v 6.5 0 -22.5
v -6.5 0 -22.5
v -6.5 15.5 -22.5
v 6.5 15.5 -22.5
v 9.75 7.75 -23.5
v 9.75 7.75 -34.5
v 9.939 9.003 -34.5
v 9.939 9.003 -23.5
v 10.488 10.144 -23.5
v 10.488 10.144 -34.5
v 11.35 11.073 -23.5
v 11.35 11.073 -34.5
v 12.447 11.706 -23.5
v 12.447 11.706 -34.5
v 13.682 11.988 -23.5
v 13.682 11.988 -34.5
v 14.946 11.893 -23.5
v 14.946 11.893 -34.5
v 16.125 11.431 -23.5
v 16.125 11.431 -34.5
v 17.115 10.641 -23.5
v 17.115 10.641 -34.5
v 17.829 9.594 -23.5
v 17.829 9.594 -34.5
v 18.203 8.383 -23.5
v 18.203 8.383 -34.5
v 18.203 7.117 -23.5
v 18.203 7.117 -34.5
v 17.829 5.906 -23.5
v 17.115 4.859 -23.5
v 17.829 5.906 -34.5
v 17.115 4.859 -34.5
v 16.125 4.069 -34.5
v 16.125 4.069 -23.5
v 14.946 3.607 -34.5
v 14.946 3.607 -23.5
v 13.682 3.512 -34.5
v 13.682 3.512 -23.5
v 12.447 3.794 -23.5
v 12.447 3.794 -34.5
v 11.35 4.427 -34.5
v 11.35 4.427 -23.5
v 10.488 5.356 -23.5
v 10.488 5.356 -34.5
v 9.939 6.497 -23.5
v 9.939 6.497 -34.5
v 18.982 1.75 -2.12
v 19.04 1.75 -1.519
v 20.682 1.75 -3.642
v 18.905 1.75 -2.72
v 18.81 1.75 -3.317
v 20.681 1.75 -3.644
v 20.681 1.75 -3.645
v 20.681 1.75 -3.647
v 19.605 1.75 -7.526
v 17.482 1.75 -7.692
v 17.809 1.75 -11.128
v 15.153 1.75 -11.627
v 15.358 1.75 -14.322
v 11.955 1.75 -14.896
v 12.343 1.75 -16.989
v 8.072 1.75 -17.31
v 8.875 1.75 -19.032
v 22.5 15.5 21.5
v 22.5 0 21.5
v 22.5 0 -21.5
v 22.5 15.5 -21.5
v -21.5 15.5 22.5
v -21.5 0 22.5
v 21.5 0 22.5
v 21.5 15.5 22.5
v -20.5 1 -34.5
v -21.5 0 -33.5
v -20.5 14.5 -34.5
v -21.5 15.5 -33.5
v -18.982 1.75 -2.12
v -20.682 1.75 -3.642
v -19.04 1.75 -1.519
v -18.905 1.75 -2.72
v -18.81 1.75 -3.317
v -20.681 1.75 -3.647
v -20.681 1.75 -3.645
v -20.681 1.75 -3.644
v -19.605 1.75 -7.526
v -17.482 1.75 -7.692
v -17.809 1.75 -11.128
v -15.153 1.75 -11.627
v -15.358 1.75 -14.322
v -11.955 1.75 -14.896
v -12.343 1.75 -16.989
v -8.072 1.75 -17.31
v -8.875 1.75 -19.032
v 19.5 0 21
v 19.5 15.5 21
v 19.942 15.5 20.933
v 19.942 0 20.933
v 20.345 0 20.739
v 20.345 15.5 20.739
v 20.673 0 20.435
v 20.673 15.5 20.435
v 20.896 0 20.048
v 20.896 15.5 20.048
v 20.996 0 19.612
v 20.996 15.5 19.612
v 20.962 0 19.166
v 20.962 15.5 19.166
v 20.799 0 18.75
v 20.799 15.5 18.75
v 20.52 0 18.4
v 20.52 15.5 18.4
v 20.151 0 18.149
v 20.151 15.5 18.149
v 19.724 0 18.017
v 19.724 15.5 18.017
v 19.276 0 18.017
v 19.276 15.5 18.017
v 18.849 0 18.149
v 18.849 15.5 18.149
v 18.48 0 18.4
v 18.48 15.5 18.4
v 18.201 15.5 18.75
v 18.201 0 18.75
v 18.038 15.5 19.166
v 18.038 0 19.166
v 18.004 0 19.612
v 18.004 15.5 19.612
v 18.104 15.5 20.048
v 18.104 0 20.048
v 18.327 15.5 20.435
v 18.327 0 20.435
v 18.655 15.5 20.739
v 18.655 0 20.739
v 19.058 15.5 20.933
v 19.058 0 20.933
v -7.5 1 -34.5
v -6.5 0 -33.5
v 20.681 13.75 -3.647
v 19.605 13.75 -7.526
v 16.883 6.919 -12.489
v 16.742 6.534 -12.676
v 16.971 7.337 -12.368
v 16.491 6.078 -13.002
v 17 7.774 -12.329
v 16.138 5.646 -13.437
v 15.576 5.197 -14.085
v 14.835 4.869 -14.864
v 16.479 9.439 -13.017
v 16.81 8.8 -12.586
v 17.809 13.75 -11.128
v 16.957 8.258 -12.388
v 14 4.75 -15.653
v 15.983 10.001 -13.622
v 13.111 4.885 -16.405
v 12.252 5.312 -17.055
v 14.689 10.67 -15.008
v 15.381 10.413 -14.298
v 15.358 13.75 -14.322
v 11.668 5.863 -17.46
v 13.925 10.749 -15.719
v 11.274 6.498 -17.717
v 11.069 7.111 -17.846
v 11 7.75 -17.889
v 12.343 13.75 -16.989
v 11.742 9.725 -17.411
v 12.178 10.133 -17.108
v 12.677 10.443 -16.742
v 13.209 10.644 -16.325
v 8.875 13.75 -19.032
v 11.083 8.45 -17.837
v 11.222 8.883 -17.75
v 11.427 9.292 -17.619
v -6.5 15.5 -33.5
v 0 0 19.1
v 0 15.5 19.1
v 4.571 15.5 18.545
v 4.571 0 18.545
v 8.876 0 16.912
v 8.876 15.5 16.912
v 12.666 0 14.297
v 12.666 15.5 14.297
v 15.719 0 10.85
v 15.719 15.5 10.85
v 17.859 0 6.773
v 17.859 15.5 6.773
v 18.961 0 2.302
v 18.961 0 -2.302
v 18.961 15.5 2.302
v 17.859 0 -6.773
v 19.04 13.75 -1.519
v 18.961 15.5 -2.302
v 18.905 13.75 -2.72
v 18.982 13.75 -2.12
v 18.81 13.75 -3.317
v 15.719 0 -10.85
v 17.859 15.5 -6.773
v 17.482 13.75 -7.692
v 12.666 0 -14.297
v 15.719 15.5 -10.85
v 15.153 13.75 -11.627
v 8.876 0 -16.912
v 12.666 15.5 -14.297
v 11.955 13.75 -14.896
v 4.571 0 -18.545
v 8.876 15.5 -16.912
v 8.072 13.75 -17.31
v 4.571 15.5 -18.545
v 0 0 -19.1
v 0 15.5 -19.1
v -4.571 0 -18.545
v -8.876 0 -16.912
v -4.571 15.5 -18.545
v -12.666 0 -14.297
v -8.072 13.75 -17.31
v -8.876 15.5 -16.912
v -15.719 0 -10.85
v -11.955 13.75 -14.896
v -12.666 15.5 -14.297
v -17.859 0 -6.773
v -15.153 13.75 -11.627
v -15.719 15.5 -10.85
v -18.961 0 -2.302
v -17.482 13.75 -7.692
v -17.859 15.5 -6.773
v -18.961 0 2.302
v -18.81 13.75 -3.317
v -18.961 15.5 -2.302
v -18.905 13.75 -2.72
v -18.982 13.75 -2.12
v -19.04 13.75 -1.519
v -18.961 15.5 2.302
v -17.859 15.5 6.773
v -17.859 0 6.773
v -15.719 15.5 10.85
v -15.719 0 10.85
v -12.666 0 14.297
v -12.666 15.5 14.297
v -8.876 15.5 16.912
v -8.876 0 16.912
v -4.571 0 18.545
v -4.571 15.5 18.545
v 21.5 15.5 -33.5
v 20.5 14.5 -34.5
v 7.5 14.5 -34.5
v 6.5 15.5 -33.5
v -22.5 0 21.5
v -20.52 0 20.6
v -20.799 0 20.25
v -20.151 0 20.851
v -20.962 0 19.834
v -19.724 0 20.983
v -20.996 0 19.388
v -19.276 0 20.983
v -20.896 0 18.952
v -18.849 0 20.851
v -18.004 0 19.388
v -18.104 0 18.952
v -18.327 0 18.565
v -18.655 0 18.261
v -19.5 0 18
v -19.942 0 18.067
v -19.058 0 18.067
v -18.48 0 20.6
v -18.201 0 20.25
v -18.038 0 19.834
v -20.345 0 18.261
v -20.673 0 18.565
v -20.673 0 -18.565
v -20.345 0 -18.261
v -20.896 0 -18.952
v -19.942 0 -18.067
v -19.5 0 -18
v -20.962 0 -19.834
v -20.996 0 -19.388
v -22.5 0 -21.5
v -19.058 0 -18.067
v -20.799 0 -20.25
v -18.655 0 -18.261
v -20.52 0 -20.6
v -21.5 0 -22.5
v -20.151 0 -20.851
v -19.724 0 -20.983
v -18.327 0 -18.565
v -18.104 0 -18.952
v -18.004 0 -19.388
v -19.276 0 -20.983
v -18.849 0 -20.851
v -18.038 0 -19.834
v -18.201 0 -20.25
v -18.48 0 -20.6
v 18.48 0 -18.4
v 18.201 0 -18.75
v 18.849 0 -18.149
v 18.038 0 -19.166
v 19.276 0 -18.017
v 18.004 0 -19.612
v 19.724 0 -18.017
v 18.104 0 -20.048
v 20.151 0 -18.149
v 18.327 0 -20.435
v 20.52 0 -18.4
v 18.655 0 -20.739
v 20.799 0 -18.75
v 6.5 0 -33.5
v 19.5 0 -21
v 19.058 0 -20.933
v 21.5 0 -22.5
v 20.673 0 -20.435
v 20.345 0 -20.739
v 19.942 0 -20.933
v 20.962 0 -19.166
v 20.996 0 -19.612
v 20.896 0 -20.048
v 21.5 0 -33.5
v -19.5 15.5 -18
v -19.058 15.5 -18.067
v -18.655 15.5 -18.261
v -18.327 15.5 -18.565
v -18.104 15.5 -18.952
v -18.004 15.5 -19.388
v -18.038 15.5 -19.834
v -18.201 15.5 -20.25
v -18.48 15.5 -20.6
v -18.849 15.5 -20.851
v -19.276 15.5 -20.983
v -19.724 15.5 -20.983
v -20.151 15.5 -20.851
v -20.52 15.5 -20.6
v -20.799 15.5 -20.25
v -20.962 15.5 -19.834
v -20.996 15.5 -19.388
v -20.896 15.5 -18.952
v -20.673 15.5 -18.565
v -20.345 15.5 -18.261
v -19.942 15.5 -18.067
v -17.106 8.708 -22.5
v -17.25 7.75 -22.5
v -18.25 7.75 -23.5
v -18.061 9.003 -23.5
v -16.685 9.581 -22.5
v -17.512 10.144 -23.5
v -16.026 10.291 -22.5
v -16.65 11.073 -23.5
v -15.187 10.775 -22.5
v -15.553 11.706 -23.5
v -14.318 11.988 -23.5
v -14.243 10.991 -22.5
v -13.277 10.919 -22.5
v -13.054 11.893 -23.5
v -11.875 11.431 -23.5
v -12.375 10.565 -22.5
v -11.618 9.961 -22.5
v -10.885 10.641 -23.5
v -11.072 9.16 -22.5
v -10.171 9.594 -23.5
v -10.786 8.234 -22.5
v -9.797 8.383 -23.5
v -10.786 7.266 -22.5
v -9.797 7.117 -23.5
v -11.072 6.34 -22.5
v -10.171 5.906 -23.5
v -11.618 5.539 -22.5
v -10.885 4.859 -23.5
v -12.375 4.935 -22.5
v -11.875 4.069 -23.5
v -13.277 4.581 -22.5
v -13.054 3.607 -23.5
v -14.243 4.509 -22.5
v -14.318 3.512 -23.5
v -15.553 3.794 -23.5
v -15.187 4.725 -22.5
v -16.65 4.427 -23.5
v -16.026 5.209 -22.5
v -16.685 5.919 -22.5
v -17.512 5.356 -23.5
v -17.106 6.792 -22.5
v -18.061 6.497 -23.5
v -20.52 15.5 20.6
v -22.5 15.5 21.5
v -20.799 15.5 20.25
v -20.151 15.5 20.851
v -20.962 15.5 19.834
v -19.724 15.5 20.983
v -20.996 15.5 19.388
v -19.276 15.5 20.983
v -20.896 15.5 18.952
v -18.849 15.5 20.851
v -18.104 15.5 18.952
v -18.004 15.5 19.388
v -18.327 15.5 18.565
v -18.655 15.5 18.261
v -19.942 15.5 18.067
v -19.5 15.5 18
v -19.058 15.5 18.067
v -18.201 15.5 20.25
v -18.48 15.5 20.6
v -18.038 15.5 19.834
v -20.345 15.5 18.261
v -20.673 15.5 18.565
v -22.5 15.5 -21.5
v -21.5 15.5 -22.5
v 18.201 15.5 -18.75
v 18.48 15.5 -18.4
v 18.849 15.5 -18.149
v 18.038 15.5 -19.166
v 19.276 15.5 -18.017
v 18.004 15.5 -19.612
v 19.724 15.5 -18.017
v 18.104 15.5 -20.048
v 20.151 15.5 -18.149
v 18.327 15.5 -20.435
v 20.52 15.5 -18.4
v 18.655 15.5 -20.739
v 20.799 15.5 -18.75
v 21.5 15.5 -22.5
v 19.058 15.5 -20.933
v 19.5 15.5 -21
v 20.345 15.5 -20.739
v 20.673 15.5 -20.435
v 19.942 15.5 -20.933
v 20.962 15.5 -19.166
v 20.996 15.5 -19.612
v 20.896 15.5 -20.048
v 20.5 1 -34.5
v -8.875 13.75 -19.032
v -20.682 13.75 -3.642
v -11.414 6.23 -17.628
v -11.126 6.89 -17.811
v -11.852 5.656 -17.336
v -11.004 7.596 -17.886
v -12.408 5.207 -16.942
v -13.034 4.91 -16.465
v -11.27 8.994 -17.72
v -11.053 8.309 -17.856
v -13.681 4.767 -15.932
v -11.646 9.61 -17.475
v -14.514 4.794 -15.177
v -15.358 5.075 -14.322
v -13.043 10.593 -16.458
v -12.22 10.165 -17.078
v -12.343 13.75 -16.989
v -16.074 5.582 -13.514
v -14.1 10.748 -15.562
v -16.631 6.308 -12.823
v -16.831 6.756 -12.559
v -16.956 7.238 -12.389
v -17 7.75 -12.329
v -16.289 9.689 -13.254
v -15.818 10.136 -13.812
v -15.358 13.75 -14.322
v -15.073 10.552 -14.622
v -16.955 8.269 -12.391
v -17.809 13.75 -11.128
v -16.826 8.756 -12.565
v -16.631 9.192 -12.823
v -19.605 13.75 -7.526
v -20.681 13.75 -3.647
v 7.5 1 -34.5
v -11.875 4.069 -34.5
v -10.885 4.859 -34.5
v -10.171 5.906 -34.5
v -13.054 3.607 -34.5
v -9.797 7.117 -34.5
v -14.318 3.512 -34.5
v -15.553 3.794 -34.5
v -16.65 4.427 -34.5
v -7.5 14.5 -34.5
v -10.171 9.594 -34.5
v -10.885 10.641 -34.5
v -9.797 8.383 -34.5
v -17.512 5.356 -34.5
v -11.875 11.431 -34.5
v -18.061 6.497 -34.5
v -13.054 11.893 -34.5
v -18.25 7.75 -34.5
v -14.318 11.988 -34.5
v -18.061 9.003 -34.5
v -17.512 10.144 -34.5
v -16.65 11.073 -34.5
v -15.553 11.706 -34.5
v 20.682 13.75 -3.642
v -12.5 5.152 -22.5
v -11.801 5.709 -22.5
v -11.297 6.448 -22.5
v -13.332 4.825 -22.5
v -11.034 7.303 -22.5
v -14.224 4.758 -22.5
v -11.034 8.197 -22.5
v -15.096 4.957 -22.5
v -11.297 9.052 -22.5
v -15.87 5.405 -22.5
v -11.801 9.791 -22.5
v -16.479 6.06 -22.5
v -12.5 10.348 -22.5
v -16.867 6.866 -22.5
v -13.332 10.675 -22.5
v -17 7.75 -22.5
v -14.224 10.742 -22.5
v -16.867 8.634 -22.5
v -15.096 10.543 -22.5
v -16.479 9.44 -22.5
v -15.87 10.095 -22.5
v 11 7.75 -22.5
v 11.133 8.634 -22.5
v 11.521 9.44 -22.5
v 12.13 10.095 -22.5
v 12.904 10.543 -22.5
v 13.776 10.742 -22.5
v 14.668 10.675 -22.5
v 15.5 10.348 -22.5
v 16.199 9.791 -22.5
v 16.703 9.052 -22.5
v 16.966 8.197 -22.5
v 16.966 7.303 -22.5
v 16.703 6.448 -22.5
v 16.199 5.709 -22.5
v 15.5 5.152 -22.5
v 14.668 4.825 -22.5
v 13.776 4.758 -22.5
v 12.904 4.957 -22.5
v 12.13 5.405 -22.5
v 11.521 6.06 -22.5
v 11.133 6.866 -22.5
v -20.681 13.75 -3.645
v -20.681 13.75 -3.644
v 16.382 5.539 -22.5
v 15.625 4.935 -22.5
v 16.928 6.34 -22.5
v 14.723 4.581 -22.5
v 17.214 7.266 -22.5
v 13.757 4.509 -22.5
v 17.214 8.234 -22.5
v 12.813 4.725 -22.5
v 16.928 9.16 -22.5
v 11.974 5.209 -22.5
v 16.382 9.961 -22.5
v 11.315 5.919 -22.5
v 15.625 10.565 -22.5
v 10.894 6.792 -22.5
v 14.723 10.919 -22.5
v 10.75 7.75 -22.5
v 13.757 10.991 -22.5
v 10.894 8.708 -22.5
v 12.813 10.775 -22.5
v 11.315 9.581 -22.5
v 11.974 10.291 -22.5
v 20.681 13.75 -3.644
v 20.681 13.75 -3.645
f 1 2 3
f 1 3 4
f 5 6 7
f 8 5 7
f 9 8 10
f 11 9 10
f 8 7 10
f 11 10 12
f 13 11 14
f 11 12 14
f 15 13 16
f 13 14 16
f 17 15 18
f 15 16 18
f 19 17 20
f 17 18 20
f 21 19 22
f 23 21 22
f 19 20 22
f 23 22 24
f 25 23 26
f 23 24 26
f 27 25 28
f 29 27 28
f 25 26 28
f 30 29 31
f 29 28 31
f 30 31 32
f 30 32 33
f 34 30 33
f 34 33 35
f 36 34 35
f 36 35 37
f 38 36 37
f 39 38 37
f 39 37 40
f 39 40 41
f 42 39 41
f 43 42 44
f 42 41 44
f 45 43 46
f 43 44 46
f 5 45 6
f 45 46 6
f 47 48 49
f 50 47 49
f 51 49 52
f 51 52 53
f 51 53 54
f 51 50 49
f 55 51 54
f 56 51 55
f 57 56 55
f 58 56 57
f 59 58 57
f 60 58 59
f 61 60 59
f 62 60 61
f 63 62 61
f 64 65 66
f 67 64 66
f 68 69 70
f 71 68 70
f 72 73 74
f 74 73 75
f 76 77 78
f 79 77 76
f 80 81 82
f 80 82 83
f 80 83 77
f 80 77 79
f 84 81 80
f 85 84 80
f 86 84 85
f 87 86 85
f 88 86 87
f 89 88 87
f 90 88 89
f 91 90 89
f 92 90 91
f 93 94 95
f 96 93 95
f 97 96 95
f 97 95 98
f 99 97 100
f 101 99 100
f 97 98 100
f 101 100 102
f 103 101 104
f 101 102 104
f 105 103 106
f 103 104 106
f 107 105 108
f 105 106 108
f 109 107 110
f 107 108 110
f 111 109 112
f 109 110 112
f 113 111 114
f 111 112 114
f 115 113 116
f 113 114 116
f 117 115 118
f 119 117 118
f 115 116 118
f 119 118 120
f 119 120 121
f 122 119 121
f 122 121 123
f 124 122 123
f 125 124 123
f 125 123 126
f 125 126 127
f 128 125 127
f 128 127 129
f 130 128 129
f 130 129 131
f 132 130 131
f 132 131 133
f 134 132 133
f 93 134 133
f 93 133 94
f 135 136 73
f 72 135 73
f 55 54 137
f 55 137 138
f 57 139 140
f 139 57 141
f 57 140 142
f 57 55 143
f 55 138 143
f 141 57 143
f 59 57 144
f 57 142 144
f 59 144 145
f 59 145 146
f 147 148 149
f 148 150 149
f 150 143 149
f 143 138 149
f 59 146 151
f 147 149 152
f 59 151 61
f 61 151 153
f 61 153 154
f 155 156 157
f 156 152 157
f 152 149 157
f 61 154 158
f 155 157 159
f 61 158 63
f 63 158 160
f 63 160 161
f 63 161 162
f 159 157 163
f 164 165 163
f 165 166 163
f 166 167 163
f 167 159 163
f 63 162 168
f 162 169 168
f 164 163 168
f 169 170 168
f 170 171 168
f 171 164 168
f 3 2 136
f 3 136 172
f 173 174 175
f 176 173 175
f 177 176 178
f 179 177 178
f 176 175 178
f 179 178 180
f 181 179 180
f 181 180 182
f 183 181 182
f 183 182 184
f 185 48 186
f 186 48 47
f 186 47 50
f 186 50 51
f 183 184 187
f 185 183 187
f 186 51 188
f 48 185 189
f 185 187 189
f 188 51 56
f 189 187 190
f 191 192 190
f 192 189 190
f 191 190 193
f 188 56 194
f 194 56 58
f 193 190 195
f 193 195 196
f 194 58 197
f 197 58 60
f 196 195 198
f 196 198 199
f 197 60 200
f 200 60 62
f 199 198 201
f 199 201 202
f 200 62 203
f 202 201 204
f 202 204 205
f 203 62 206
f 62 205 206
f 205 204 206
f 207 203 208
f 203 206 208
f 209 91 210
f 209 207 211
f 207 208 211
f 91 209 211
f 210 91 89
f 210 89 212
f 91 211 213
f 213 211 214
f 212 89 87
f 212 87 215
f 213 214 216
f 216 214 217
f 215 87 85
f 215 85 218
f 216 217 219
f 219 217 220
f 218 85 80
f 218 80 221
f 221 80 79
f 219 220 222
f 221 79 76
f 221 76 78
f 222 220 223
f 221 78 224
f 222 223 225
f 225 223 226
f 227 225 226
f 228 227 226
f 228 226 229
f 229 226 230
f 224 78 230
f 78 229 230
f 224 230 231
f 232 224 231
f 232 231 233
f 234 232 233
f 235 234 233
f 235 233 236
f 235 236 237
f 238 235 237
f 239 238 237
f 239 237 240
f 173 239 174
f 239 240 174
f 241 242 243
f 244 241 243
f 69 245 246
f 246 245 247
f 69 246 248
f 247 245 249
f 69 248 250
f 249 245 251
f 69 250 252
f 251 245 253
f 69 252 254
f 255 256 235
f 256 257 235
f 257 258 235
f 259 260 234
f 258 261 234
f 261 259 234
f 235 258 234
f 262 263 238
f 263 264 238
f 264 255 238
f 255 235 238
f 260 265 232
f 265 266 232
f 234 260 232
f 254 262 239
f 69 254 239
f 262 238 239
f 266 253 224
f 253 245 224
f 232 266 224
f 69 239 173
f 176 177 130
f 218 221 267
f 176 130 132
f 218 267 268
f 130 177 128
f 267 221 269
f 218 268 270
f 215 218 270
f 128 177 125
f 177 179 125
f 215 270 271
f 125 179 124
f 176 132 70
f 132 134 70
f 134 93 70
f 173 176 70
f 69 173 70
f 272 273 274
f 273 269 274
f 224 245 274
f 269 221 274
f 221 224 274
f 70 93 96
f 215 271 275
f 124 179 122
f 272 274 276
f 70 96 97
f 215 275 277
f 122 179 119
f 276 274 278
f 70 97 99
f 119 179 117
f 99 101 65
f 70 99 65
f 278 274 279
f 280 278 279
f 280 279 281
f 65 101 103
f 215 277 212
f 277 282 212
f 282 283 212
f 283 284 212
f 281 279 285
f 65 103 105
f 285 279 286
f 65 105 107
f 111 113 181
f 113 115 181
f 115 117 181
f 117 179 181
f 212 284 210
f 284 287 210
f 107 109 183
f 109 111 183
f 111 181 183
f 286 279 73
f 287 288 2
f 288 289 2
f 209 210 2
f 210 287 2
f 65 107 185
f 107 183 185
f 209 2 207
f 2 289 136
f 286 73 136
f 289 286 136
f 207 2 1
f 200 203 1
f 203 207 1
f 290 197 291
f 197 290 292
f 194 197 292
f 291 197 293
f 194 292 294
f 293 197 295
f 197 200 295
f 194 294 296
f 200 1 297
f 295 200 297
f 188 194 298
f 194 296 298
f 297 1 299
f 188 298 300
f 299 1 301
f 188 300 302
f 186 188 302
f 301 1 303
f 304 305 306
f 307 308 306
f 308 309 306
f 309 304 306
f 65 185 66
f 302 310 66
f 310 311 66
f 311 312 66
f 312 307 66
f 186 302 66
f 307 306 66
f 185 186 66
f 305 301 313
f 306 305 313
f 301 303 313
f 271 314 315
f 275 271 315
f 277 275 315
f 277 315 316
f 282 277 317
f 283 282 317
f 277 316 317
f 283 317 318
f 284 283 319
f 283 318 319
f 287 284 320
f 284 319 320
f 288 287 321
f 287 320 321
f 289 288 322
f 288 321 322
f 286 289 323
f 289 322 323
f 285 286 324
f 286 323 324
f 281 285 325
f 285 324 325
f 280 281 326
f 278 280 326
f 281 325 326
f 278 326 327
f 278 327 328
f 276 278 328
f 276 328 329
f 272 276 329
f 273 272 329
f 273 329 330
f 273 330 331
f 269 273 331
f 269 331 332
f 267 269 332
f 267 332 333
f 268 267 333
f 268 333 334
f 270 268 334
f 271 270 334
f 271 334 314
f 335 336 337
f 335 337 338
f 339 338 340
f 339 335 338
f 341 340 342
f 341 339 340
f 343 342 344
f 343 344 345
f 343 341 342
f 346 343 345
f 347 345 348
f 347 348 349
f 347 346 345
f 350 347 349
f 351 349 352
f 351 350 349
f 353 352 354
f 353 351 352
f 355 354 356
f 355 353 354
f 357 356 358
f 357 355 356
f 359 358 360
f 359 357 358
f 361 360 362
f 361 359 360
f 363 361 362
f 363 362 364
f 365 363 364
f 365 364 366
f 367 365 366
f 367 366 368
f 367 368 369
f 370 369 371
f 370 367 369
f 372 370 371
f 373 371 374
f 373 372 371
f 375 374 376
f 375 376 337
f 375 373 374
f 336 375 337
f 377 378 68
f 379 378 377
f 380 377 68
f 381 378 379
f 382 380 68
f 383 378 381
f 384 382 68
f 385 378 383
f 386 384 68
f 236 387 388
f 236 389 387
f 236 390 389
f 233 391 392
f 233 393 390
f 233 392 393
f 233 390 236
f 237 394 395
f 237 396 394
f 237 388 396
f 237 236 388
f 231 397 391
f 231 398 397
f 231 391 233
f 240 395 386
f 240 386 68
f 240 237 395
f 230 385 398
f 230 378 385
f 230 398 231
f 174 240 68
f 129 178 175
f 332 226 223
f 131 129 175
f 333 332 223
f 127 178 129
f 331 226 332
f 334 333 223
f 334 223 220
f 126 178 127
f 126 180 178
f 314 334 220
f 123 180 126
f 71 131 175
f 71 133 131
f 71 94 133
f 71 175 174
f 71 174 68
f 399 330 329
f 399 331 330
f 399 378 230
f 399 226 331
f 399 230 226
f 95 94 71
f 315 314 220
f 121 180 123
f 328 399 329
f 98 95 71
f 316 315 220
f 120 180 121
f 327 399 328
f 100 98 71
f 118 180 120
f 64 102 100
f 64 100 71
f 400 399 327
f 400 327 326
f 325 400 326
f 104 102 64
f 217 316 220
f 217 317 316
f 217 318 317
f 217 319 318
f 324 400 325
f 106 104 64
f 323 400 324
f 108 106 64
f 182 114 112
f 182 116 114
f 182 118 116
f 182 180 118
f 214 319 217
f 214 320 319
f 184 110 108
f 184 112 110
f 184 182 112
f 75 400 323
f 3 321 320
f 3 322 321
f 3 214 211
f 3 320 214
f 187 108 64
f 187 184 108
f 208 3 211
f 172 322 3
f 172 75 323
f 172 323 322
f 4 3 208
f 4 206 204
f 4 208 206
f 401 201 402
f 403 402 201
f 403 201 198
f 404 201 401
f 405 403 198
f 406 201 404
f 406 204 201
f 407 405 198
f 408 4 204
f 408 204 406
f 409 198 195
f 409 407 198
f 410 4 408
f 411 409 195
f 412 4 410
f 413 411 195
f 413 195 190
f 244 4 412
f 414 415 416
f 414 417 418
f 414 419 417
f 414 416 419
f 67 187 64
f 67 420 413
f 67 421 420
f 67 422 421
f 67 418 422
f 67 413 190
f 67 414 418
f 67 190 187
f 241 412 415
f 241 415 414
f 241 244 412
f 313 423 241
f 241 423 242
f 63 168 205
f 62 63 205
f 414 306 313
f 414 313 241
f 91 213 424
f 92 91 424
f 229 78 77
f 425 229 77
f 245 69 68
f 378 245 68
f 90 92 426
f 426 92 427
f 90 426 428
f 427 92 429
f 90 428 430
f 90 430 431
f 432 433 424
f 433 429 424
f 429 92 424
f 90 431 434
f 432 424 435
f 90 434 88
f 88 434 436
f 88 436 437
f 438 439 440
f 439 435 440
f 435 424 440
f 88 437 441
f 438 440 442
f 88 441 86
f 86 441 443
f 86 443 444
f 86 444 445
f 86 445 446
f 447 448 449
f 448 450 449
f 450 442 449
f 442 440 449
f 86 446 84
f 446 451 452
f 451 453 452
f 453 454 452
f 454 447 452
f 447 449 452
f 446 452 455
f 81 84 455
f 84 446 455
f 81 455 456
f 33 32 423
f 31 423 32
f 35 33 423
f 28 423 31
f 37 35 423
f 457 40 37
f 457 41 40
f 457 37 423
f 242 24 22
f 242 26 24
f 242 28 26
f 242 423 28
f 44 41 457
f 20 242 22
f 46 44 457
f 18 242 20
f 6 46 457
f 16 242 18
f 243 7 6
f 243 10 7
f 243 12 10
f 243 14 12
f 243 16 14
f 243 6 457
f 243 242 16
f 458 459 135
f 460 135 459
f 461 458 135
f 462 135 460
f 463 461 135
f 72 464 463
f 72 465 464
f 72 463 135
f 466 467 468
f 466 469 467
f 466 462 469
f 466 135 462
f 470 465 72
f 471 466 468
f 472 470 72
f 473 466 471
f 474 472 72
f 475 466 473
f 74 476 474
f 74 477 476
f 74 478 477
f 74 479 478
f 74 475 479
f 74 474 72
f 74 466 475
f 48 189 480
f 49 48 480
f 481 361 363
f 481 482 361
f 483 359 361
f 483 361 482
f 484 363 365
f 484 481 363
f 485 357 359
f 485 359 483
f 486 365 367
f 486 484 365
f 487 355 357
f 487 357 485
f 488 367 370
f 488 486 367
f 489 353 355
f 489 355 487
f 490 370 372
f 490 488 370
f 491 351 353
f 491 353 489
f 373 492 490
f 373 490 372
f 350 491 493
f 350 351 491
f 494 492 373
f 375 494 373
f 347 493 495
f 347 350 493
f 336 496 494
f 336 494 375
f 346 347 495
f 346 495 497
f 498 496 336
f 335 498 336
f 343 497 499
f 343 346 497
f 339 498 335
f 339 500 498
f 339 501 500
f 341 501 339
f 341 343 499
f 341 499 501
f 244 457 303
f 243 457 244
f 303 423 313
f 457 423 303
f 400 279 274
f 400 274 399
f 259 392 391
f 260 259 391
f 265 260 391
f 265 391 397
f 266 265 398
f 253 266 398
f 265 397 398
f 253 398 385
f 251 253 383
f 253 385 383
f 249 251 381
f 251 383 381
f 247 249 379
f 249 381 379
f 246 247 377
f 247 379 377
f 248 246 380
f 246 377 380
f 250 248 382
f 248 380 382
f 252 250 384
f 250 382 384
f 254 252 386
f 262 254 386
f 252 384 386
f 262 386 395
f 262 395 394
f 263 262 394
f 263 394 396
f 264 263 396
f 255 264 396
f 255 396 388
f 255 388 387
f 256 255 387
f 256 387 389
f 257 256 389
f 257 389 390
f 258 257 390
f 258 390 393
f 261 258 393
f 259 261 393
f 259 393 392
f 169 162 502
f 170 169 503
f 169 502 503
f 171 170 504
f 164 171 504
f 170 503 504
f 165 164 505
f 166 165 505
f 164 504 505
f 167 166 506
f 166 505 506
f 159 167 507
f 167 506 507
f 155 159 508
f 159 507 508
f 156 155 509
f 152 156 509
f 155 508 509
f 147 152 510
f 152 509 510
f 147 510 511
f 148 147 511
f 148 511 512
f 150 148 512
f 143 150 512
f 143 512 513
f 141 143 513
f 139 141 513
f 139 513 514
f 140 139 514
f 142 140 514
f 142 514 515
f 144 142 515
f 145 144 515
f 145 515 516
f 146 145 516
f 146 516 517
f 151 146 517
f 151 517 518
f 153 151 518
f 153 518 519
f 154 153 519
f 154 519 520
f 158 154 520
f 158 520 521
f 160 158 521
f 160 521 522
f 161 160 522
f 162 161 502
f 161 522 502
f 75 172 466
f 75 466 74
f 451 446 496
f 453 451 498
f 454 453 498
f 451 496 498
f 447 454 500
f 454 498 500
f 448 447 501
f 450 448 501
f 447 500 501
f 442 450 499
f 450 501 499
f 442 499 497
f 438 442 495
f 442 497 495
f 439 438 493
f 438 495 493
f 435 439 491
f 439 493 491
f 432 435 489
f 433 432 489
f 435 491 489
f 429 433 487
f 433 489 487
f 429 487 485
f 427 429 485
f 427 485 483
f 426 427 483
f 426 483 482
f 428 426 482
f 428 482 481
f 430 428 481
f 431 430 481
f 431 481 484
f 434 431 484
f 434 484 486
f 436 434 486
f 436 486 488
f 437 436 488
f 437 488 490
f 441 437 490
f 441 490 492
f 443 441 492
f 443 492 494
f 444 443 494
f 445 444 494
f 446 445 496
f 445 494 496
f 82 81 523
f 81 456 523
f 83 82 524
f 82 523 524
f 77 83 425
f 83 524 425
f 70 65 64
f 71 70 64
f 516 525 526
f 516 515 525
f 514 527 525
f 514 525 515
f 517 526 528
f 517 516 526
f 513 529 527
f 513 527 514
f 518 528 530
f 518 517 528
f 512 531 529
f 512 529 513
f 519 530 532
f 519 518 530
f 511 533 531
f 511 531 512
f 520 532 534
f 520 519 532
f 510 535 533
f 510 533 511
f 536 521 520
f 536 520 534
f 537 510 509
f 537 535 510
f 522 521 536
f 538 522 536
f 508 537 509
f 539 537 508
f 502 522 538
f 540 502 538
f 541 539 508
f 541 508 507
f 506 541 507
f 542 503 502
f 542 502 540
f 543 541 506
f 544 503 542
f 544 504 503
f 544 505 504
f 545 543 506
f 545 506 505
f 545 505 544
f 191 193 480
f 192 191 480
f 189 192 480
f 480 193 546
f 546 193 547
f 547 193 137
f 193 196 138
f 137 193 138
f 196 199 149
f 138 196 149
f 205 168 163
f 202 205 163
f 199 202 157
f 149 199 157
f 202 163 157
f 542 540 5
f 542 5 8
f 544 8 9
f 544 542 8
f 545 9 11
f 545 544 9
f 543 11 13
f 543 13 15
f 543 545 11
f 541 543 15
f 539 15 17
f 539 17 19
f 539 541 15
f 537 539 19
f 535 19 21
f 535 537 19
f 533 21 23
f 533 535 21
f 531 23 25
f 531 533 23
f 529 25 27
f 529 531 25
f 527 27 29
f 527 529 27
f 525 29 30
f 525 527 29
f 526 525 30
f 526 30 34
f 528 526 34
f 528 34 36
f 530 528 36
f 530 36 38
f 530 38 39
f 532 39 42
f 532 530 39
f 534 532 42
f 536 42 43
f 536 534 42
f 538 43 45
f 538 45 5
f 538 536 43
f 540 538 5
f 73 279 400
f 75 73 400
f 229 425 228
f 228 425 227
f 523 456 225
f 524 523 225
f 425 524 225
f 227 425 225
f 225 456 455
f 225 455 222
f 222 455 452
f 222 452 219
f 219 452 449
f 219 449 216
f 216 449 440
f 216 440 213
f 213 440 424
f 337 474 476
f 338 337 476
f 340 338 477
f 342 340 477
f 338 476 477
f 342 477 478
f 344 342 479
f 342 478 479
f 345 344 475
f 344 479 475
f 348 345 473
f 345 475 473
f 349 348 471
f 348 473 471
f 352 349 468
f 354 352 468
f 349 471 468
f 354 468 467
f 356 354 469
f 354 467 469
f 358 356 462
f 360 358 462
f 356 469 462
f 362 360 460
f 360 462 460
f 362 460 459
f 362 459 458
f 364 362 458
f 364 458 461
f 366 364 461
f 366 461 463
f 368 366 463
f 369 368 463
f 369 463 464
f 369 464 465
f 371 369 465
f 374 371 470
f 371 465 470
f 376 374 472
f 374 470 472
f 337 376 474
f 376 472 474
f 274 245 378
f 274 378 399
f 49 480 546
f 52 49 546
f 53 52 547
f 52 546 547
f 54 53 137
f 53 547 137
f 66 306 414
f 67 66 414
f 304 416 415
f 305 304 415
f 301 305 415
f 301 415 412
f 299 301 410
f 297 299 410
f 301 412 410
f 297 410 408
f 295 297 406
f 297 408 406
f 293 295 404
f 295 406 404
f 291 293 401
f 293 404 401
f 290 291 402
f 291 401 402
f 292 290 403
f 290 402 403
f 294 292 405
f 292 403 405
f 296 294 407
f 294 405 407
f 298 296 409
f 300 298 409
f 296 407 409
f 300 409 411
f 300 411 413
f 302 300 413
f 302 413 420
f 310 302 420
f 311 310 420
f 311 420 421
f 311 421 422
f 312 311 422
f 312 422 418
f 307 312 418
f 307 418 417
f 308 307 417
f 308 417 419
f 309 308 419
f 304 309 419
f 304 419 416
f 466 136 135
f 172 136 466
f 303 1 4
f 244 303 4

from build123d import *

# Parameters (mm, degrees)
SKETCH_1_W               = 45
SKETCH_1_H               = 45
EXTRUDE_1_DEPTH          = 15.5
SKETCH_2_R               = 19.1
CUT_EXTRUDE_1_DEPTH      = 36.394208566
SKETCH_5_W               = 15
SKETCH_5_H               = 15.5
EXTRUDE_2_DEPTH          = 12
SKETCH_6_R               = 3
CUT_EXTRUDE_4_DEPTH      = 35
SKETCH_7_R               = 1.5
CUT_EXTRUDE_5_DEPTH      = 45.008522016
CUT_EXTRUDE_6_DEPTH      = 6
CUT_EXTRUDE_6_DEPTH_BACK = 6
SKETCH_9_R               = 4.25
CUT_EXTRUDE_7_DEPTH      = 12
CHAMFER_2_SIZE           = 1
CHAMFER_3_SIZE           = 1
CHAMFER_4_SIZE           = 1


# Some blends are built 0.0001 mm under size
with BuildPart() as part:
    # 草图1 → 凸台-拉伸1 (new body)
    with BuildSketch(Plane(origin=(0, 0, 0), x_dir=(1, 0, 0), z_dir=(0, 1, 0))):
        Rectangle(SKETCH_1_W, SKETCH_1_H)
    extrude(amount=EXTRUDE_1_DEPTH)

    # 草图2 → 切除-拉伸1 (cut, through all)
    with BuildSketch(Plane(origin=(0, 15.5, 0), x_dir=(1, 0, 0), z_dir=(0, 1, 0))):
        with Locations(Location((0, 0, 0), (0, 0, 270))):
            Circle(SKETCH_2_R)
    extrude(amount=-CUT_EXTRUDE_1_DEPTH, mode=Mode.SUBTRACT)

    # 草图5 → 凸台-拉伸2 (add)
    with BuildSketch(Plane(origin=(0, 0, -22.5), x_dir=(-1, 0, 0), z_dir=(0, 0, -1))):
        with Locations((14, 7.75)):
            Rectangle(SKETCH_5_W, SKETCH_5_H)
        with Locations((-14, 7.75)):
            Rectangle(SKETCH_5_W, SKETCH_5_H)
    extrude(amount=EXTRUDE_2_DEPTH)

    # 草图6 → 切除-拉伸4 (cut)
    with BuildSketch(Plane(origin=(0, 0, -34.5), x_dir=(-1, 0, 0), z_dir=(0, 0, -1))):
        with Locations((-14, 7.75)):
            Circle(SKETCH_6_R)
        with Locations((14, 7.75)):
            Circle(SKETCH_6_R)
    extrude(amount=-CUT_EXTRUDE_4_DEPTH, mode=Mode.SUBTRACT)

    # 草图7 → 切除-拉伸5 (cut, through all)
    with BuildSketch(Plane(origin=(0, 15.5, 0), x_dir=(1, 0, 0), z_dir=(0, 1, 0))):
        with Locations(Location((-19.5, 19.5, 0), (0, 0, 270))):
            Circle(SKETCH_7_R)
        with Locations(Location((19.5, 19.5, 0), (0, 0, 90))):
            Circle(SKETCH_7_R)
        with Locations(Location((19.5, -19.5, 0), (0, 0, 270))):
            Circle(SKETCH_7_R)
        with Locations(Location((-19.5, -19.5, 0), (0, 0, 90))):
            Circle(SKETCH_7_R)
    extrude(amount=-CUT_EXTRUDE_5_DEPTH, mode=Mode.SUBTRACT)

    # 草图8 → 切除-拉伸6 (cut, two sides: drawn at the far end of the back side and taken through both)
    with BuildSketch(Plane(origin=(0, 7.75, 0), x_dir=(-1, 0, 0), z_dir=(0, -1, 0)).offset(-CUT_EXTRUDE_6_DEPTH_BACK)):
        with BuildLine():
            Line((-8.874983497, 19.032463528), (-8.072008799, 17.310478732))
            ThreePointArc((-8.072008799, 17.310478732), (-15.1530488, 11.627343294), (-18.809828083, 3.316680193))
            Line((-18.809828083, 3.316680193), (-20.680962813, 3.646611731))
            ThreePointArc((-20.680962813, 3.646611731), (-16.660420146, 12.783990009), (-8.874983497, 19.032463528))
        make_face()
        with BuildLine():
            Line((20.680962813, 3.646611731), (18.809828083, 3.316680193))
            ThreePointArc((18.809828083, 3.316680193), (15.1530488, 11.627343294), (8.072008799, 17.310478732))
            Line((8.072008799, 17.310478732), (8.874983497, 19.032463528))
            ThreePointArc((8.874983497, 19.032463528), (16.660420146, 12.783990009), (20.680962813, 3.646611731))
        make_face()
    extrude(amount=CUT_EXTRUDE_6_DEPTH + CUT_EXTRUDE_6_DEPTH_BACK, mode=Mode.SUBTRACT)

    # 草图9 → 切除-拉伸7 (cut)
    with BuildSketch(Plane(origin=(0, 0, -34.5), x_dir=(-1, 0, 0), z_dir=(0, 0, -1))):
        with Locations((-14, 7.75)):
            Circle(SKETCH_9_R)
        with Locations((14, 7.75)):
            Circle(SKETCH_9_R)
    extrude(amount=-CUT_EXTRUDE_7_DEPTH, mode=Mode.SUBTRACT)

    # 倒角1
    # the kernel refuses this chamfer: 2 mm, written as the material it takes off along each edge
    with BuildSketch(Plane(origin=(-18.809828083, 1.75, -3.316680193), x_dir=(-0.09666023054018325, 0, 0.9953174367165073), z_dir=(0, 1, 0))) as chamfer_1_piece_1_section:
        with BuildLine():
            Line((1.811638226, -0.054831322), (-0.147910468, -1.899248595))
            Line((-0.147910468, -1.899248595), (0, 0))
            ThreePointArc((0, 0), (0.933514183, -0.049753736), (1.811638226, -0.054831322))
        make_face()
    chamfer_1_piece_1 = extrude(amount=12, mode=Mode.PRIVATE)
    chamfer_1_piece_1 = chamfer_1_piece_1 & Plane(origin=(0, 7.75, 0), x_dir=(-0.42261826174070266, 0, -0.9063077870366485), z_dir=(0, 1, 0)) * Cylinder(21, 32, mode=Mode.PRIVATE)
    add(chamfer_1_piece_1, mode=Mode.SUBTRACT)
    with BuildSketch(Plane(origin=(18.809828083, 13.75, -3.316680193), x_dir=(0.09666023054018283, 0, 0.9953174367165073), z_dir=(0, -1, 0))) as chamfer_1_piece_2_section:
        with BuildLine():
            Line((1.811638226, -0.054831322), (-0.147910468, -1.899248595))
            Line((-0.147910468, -1.899248595), (0, 0))
            ThreePointArc((0, 0), (0.933514183, -0.049753736), (1.811638226, -0.054831322))
        make_face()
    chamfer_1_piece_2 = extrude(amount=12, mode=Mode.PRIVATE)
    chamfer_1_piece_2 = chamfer_1_piece_2 & Plane(origin=(0, 7.75, 0), x_dir=(0.9848077530122075, 0, -0.17364817766693397), z_dir=(0, 1, 0)) * Cylinder(21, 32, mode=Mode.PRIVATE)
    add(chamfer_1_piece_2, mode=Mode.SUBTRACT)

    # 倒角2
    chamfer_2_edges = [part.edges().sort_by_distance(p)[0] for p in [
        (22.5, 7.75, 22.5),
        (-22.5, 7.75, 22.5),
        (-22.5, 7.75, -22.5),
        (22.5, 7.75, -22.5),
    ]]
    chamfer(chamfer_2_edges, length=CHAMFER_2_SIZE - 0.0001)  # a hair under: the kernel refuses the full size

    # 倒角3
    chamfer_3_edges = [part.edges().sort_by_distance(p)[0] for p in [
        (18.25, 7.75, -22.5),
        (-9.75, 7.75, -22.5),
    ]]
    chamfer(chamfer_3_edges, length=CHAMFER_3_SIZE)

    # 倒角4
    chamfer_4_edges = [part.edges().sort_by_distance(p)[0] for p in [
        (6.5, 7.75, -34.5),
        (14, 15.5, -34.5),
        (21.5, 7.75, -34.5),
        (14, 0, -34.5),
        (-21.5, 7.75, -34.5),
        (-14, 15.5, -34.5),
        (-6.5, 7.75, -34.5),
        (-14, 0, -34.5),
    ]]
    chamfer(chamfer_4_edges, length=CHAMFER_4_SIZE)


solid = part.part
